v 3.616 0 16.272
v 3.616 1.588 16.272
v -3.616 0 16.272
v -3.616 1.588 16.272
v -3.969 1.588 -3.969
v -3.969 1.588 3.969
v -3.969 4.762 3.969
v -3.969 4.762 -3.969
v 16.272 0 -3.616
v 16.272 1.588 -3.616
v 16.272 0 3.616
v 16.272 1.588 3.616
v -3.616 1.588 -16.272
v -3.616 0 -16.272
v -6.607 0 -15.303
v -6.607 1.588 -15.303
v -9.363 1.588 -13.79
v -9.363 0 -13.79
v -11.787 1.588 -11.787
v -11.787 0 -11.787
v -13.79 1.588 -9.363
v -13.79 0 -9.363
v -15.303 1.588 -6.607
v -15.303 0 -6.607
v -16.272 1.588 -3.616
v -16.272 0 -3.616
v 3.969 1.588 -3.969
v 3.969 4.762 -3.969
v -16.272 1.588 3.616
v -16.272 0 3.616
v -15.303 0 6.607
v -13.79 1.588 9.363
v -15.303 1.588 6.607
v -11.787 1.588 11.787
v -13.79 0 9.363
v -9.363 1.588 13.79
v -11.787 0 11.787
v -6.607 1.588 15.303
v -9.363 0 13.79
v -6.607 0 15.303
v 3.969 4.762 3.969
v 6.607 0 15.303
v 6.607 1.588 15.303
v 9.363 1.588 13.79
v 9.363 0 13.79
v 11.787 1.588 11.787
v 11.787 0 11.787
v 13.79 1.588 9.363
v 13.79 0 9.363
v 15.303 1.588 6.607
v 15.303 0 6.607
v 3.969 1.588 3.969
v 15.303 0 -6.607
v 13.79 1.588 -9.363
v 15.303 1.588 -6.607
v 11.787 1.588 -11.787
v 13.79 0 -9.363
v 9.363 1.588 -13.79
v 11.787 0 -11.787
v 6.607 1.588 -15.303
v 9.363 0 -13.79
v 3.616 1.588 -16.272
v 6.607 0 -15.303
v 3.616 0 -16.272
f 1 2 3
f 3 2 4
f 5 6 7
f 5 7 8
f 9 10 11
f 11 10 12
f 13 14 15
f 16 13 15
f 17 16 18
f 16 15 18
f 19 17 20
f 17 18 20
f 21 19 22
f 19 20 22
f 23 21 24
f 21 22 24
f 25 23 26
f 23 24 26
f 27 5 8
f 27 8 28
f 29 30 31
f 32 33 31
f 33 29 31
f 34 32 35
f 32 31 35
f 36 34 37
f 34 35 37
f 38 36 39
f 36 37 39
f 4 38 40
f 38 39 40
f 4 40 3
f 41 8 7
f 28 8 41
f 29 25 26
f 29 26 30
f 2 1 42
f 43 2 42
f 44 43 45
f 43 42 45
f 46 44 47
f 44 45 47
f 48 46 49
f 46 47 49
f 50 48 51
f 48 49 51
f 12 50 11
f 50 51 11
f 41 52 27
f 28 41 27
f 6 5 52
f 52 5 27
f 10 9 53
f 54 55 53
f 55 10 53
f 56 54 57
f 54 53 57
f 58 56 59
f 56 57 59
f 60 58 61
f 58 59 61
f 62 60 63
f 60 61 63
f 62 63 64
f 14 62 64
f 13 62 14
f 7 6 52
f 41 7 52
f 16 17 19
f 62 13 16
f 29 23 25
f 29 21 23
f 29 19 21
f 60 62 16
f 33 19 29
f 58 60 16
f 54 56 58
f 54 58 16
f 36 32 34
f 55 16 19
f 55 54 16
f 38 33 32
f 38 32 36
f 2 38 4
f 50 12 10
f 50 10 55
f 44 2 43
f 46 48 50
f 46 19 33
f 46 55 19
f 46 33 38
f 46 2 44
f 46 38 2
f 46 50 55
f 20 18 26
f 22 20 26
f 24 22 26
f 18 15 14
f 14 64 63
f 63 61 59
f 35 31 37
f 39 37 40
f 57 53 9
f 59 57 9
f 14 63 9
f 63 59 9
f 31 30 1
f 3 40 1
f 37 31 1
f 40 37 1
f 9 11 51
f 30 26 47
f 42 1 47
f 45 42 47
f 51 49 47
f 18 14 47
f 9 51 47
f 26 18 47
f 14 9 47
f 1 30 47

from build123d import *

# Parameters (mm, degrees)
SKETCH1_R           = 16.66875
BOSS_EXTRUDE1_DEPTH = 1.5875
CUT_EXTRUDE1_REACH  = 25.627
SKETCH3_W           = 7.9375
SKETCH3_H           = 7.9375
BOSS_EXTRUDE2_DEPTH = 3.175


with BuildPart() as part:
    # Sketch1 → Boss-Extrude1 (new body)
    with BuildSketch(Plane(origin=(0, 0, 0), x_dir=(1, 0, 0), z_dir=(0, 1, 0))):
        with Locations(Location((0, 0, 0), (0, 0, 270))):
            Circle(SKETCH1_R)
    extrude(amount=BOSS_EXTRUDE1_DEPTH)

    # Sketch2 → Cut-Extrude1 (cut, up to next)
    with BuildSketch(Plane(origin=(0, 1.5875, 0), x_dir=(1, 0, 0), z_dir=(0, 1, 0)), mode=Mode.PRIVATE) as cut_extrude1_sk1:
        with BuildLine():
            Line((-16.271875, 3.615703327), (-16.271875, -3.615703327))
            ThreePointArc((-16.271875, -3.615703327), (-16.66875, 0), (-16.271875, 3.615703327))
        make_face()
    cut_extrude1_tool1 = extrude(cut_extrude1_sk1.sketch, amount=-CUT_EXTRUDE1_REACH, mode=Mode.PRIVATE) & part.part
    # Sketch2 → Cut-Extrude1 (cut, up to next)
    with BuildSketch(Plane(origin=(0, 1.5875, 0), x_dir=(1, 0, 0), z_dir=(0, 1, 0)), mode=Mode.PRIVATE) as cut_extrude1_sk2:
        with BuildLine():
            Line((16.271875, 3.615703327), (16.271875, -3.615703327))
            ThreePointArc((16.271875, -3.615703327), (16.66875, 0), (16.271875, 3.615703327))
        make_face()
    cut_extrude1_tool2 = extrude(cut_extrude1_sk2.sketch, amount=-CUT_EXTRUDE1_REACH, mode=Mode.PRIVATE) & part.part
    # Sketch2 → Cut-Extrude1 (cut, up to next)
    with BuildSketch(Plane(origin=(0, 1.5875, 0), x_dir=(1, 0, 0), z_dir=(0, 1, 0)), mode=Mode.PRIVATE) as cut_extrude1_sk3:
        with BuildLine():
            Line((3.615703327, 16.271875), (-3.615703327, 16.271875))
            ThreePointArc((-3.615703327, 16.271875), (0, 16.66875), (3.615703327, 16.271875))
        make_face()
    cut_extrude1_tool3 = extrude(cut_extrude1_sk3.sketch, amount=-CUT_EXTRUDE1_REACH, mode=Mode.PRIVATE) & part.part
    # Sketch2 → Cut-Extrude1 (cut, up to next)
    with BuildSketch(Plane(origin=(0, 1.5875, 0), x_dir=(1, 0, 0), z_dir=(0, 1, 0)), mode=Mode.PRIVATE) as cut_extrude1_sk4:
        with BuildLine():
            Line((3.615703327, -16.271875), (-3.615703327, -16.271875))
            ThreePointArc((-3.615703327, -16.271875), (0, -16.66875), (3.615703327, -16.271875))
        make_face()
    cut_extrude1_tool4 = extrude(cut_extrude1_sk4.sketch, amount=-CUT_EXTRUDE1_REACH, mode=Mode.PRIVATE) & part.part
    add(cut_extrude1_tool1.solids().sort_by_distance((-16.430788, 1.5875, 0))[0], mode=Mode.SUBTRACT)
    add(cut_extrude1_tool2.solids().sort_by_distance((16.430788, 1.5875, 0))[0], mode=Mode.SUBTRACT)
    add(cut_extrude1_tool3.solids().sort_by_distance((0, 1.5875, -16.430788))[0], mode=Mode.SUBTRACT)
    add(cut_extrude1_tool4.solids().sort_by_distance((0, 1.5875, 16.430788))[0], mode=Mode.SUBTRACT)


with BuildPart() as body_2:
    # Sketch3 → Boss-Extrude2 (new body)
    with BuildSketch(Plane(origin=(0, 1.5875, 0), x_dir=(1, 0, 0), z_dir=(0, 1, 0))):
        Rectangle(SKETCH3_W, SKETCH3_H)
    extrude(amount=BOSS_EXTRUDE2_DEPTH)


solid = Compound([part.part, body_2.part])
